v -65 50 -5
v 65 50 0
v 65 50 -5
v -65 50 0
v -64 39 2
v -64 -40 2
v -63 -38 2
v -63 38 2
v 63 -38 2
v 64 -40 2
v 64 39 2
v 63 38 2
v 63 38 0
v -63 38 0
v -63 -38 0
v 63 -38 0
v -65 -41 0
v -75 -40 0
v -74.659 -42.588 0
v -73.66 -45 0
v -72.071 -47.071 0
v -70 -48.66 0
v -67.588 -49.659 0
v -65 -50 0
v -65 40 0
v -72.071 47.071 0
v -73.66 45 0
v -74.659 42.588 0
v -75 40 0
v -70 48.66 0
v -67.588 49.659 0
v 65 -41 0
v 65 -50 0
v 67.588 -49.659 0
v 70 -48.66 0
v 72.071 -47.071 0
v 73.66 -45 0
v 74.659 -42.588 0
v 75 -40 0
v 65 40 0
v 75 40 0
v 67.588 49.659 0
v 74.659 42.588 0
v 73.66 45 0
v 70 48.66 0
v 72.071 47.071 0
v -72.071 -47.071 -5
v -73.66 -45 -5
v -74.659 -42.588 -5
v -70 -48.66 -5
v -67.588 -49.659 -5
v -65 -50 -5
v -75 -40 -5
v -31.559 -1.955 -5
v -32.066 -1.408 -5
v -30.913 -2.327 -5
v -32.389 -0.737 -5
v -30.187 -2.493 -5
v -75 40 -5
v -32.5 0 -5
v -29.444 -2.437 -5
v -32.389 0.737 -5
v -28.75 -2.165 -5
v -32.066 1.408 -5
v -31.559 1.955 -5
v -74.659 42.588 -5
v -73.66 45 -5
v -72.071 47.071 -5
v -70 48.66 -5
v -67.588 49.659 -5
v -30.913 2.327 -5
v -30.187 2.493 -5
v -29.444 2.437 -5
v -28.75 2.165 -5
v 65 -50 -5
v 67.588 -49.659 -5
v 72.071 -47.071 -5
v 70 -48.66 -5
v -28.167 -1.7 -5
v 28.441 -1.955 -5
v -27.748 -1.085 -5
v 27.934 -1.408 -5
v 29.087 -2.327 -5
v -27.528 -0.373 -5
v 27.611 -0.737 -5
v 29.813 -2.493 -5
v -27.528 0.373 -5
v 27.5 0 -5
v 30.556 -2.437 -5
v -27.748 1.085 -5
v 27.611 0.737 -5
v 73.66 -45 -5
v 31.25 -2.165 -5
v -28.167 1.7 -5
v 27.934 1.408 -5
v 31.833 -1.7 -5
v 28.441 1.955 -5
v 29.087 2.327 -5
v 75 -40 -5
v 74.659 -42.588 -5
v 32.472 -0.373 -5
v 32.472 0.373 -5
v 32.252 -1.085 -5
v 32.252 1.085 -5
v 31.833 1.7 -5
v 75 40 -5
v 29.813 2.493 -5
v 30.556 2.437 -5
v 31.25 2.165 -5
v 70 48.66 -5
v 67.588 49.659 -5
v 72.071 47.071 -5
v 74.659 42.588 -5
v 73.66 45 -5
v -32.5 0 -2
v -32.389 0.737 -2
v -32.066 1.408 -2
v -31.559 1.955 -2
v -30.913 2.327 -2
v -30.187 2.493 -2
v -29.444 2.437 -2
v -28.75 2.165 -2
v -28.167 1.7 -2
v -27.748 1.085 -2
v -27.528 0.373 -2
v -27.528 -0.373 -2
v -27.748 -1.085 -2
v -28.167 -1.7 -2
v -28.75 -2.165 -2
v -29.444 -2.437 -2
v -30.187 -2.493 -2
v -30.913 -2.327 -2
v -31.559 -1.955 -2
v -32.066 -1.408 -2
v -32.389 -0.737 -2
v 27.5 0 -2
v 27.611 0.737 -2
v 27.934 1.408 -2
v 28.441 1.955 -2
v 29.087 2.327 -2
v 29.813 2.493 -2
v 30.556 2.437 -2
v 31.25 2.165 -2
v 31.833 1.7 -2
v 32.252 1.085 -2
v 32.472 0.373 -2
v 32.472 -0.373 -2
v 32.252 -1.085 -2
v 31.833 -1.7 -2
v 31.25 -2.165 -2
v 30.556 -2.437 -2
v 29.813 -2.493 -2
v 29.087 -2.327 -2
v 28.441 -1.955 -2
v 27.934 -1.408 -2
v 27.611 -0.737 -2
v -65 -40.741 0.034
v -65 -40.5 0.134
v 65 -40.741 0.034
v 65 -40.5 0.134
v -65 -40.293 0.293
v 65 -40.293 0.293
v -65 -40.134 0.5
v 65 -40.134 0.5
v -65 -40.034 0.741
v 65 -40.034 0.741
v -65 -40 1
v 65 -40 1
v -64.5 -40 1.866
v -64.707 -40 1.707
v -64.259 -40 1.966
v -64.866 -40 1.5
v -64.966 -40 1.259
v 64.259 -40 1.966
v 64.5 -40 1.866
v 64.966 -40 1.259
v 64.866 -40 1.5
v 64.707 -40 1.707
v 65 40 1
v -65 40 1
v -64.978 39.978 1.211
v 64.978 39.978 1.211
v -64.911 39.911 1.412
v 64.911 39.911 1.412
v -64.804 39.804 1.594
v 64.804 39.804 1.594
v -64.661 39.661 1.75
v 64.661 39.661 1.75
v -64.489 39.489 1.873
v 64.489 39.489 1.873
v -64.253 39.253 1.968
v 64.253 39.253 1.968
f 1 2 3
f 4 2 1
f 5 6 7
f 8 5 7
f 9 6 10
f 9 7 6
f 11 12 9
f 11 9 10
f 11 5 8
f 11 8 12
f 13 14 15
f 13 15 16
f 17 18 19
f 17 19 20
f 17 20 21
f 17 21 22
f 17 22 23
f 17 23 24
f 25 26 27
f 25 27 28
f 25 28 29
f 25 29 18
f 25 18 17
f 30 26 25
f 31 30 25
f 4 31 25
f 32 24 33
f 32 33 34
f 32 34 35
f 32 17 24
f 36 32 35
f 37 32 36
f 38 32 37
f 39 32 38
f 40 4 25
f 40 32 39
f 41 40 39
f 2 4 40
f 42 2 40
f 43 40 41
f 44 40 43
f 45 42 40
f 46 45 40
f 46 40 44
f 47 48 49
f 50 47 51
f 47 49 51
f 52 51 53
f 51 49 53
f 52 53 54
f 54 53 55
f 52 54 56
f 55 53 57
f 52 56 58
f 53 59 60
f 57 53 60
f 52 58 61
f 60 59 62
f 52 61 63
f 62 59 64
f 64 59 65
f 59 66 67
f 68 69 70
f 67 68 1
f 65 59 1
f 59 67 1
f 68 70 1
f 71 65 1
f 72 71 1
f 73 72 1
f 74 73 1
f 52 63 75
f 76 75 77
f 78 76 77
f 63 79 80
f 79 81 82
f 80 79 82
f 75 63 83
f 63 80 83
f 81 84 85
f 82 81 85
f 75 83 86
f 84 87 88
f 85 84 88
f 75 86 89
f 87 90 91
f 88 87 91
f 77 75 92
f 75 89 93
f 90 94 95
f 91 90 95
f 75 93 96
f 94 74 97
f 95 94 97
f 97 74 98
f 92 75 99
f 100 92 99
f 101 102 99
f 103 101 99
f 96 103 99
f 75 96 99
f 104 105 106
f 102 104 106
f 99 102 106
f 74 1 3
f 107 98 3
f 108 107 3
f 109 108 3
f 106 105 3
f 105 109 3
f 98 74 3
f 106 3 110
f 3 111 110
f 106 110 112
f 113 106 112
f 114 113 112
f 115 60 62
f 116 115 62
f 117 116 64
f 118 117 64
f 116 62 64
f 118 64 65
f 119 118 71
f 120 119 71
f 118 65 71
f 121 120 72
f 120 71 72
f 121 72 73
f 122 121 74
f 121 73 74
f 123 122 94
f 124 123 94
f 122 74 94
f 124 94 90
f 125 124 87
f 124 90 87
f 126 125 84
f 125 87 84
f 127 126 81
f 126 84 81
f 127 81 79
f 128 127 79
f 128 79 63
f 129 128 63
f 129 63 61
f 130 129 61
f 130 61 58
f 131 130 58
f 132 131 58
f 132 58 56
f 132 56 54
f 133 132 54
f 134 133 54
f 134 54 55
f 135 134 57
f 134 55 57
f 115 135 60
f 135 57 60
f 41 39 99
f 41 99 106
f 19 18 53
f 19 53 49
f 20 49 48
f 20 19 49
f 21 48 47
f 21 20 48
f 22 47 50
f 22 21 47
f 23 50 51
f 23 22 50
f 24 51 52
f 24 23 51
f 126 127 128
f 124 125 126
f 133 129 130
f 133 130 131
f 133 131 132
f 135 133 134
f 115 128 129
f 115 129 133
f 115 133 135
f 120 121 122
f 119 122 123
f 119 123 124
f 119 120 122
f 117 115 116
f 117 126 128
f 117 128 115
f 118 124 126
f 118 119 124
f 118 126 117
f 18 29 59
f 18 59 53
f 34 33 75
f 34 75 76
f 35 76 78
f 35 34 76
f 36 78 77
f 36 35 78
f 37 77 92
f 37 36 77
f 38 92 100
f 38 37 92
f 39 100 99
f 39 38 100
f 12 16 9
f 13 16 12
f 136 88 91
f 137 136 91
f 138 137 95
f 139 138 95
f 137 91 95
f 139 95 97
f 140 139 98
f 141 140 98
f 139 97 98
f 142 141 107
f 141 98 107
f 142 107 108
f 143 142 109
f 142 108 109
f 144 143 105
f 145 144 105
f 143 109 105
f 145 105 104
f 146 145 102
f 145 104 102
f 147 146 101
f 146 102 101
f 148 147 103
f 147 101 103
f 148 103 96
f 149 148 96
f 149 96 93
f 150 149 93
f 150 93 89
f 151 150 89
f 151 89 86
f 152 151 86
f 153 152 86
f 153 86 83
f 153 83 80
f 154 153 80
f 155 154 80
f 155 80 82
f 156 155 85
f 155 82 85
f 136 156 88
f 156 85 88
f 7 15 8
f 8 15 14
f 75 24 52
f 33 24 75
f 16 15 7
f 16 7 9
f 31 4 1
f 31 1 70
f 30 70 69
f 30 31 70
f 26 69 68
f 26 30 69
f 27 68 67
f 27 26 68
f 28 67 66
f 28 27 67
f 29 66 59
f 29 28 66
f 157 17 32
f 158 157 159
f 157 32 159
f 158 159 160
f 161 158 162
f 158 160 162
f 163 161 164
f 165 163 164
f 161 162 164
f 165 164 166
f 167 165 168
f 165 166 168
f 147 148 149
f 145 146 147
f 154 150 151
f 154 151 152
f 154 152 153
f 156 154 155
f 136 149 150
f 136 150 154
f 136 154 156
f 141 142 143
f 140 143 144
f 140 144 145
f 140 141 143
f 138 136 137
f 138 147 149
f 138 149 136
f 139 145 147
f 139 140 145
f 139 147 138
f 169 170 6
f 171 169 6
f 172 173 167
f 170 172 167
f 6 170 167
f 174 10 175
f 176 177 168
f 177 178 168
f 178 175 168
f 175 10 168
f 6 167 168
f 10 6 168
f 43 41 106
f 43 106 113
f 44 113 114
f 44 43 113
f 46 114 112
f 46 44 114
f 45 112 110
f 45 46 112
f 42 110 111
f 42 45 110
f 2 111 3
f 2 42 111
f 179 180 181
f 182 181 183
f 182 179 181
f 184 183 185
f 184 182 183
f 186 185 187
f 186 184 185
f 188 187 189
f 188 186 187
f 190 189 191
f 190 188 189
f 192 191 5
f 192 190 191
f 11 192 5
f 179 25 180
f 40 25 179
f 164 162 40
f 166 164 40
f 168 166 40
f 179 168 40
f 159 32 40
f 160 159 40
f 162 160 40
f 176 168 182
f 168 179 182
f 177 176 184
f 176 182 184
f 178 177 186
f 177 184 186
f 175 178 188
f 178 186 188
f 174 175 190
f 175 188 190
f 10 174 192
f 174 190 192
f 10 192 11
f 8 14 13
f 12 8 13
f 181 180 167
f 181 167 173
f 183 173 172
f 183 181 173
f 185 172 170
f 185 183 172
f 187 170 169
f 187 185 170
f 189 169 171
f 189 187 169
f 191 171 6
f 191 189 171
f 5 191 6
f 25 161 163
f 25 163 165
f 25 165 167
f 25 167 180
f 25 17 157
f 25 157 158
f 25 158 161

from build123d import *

# Parameters (mm, degrees)
BOSS_EXTRUDE1_DEPTH = 5
SKETCH2_W           = 130
SKETCH2_H           = 80
SKETCH2_W_2         = 126
SKETCH2_H_2         = 76
BOSS_EXTRUDE2_DEPTH = 2
FILLET1_R           = 1
SKETCH3_R           = 2.5
CUT_EXTRUDE1_DEPTH  = 3


with BuildPart() as part:
    # Sketch1 → Boss-Extrude1 (new body)
    with BuildSketch(Plane.XY):
        with BuildLine():
            Line((65, 50), (-65, 50))
            ThreePointArc((-65, 50), (-72.071067812, 47.071067812), (-75, 40))
            Line((-75, 40), (-75, -40))
            ThreePointArc((-75, -40), (-72.071067812, -47.071067812), (-65, -50))
            Line((-65, -50), (65, -50))
            ThreePointArc((65, -50), (72.071067812, -47.071067812), (75, -40))
            Line((75, -40), (75, 40))
            ThreePointArc((75, 40), (72.071067812, 47.071067812), (65, 50))
        make_face()
    extrude(amount=-BOSS_EXTRUDE1_DEPTH)

    # Sketch2 → Boss-Extrude2 (add)
    with BuildSketch(Plane.XY):
        Rectangle(SKETCH2_W, SKETCH2_H)
        Rectangle(SKETCH2_W_2, SKETCH2_H_2, mode=Mode.SUBTRACT)
    extrude(amount=BOSS_EXTRUDE2_DEPTH)

    # Fillet1
    fillet1_edges = [part.edges().sort_by_distance(p)[0] for p in [
        (0, -40, 0),
        (65, 0, 2),
        (-65, 0, 2),
        (0, 40, 2),
    ]]
    fillet(fillet1_edges, radius=FILLET1_R - 0.0001)  # a hair under: the kernel refuses the full size

    # Sketch3 → Cut-Extrude1 (cut)
    with BuildSketch(Plane(origin=(0, 0, -5), x_dir=(-1, 0, 0), z_dir=(0, 0, -1))):
        with Locations((-30, 0)):
            Circle(SKETCH3_R)
        with Locations((30, 0)):
            Circle(SKETCH3_R)
    extrude(amount=-CUT_EXTRUDE1_DEPTH, mode=Mode.SUBTRACT)


solid = part.part
